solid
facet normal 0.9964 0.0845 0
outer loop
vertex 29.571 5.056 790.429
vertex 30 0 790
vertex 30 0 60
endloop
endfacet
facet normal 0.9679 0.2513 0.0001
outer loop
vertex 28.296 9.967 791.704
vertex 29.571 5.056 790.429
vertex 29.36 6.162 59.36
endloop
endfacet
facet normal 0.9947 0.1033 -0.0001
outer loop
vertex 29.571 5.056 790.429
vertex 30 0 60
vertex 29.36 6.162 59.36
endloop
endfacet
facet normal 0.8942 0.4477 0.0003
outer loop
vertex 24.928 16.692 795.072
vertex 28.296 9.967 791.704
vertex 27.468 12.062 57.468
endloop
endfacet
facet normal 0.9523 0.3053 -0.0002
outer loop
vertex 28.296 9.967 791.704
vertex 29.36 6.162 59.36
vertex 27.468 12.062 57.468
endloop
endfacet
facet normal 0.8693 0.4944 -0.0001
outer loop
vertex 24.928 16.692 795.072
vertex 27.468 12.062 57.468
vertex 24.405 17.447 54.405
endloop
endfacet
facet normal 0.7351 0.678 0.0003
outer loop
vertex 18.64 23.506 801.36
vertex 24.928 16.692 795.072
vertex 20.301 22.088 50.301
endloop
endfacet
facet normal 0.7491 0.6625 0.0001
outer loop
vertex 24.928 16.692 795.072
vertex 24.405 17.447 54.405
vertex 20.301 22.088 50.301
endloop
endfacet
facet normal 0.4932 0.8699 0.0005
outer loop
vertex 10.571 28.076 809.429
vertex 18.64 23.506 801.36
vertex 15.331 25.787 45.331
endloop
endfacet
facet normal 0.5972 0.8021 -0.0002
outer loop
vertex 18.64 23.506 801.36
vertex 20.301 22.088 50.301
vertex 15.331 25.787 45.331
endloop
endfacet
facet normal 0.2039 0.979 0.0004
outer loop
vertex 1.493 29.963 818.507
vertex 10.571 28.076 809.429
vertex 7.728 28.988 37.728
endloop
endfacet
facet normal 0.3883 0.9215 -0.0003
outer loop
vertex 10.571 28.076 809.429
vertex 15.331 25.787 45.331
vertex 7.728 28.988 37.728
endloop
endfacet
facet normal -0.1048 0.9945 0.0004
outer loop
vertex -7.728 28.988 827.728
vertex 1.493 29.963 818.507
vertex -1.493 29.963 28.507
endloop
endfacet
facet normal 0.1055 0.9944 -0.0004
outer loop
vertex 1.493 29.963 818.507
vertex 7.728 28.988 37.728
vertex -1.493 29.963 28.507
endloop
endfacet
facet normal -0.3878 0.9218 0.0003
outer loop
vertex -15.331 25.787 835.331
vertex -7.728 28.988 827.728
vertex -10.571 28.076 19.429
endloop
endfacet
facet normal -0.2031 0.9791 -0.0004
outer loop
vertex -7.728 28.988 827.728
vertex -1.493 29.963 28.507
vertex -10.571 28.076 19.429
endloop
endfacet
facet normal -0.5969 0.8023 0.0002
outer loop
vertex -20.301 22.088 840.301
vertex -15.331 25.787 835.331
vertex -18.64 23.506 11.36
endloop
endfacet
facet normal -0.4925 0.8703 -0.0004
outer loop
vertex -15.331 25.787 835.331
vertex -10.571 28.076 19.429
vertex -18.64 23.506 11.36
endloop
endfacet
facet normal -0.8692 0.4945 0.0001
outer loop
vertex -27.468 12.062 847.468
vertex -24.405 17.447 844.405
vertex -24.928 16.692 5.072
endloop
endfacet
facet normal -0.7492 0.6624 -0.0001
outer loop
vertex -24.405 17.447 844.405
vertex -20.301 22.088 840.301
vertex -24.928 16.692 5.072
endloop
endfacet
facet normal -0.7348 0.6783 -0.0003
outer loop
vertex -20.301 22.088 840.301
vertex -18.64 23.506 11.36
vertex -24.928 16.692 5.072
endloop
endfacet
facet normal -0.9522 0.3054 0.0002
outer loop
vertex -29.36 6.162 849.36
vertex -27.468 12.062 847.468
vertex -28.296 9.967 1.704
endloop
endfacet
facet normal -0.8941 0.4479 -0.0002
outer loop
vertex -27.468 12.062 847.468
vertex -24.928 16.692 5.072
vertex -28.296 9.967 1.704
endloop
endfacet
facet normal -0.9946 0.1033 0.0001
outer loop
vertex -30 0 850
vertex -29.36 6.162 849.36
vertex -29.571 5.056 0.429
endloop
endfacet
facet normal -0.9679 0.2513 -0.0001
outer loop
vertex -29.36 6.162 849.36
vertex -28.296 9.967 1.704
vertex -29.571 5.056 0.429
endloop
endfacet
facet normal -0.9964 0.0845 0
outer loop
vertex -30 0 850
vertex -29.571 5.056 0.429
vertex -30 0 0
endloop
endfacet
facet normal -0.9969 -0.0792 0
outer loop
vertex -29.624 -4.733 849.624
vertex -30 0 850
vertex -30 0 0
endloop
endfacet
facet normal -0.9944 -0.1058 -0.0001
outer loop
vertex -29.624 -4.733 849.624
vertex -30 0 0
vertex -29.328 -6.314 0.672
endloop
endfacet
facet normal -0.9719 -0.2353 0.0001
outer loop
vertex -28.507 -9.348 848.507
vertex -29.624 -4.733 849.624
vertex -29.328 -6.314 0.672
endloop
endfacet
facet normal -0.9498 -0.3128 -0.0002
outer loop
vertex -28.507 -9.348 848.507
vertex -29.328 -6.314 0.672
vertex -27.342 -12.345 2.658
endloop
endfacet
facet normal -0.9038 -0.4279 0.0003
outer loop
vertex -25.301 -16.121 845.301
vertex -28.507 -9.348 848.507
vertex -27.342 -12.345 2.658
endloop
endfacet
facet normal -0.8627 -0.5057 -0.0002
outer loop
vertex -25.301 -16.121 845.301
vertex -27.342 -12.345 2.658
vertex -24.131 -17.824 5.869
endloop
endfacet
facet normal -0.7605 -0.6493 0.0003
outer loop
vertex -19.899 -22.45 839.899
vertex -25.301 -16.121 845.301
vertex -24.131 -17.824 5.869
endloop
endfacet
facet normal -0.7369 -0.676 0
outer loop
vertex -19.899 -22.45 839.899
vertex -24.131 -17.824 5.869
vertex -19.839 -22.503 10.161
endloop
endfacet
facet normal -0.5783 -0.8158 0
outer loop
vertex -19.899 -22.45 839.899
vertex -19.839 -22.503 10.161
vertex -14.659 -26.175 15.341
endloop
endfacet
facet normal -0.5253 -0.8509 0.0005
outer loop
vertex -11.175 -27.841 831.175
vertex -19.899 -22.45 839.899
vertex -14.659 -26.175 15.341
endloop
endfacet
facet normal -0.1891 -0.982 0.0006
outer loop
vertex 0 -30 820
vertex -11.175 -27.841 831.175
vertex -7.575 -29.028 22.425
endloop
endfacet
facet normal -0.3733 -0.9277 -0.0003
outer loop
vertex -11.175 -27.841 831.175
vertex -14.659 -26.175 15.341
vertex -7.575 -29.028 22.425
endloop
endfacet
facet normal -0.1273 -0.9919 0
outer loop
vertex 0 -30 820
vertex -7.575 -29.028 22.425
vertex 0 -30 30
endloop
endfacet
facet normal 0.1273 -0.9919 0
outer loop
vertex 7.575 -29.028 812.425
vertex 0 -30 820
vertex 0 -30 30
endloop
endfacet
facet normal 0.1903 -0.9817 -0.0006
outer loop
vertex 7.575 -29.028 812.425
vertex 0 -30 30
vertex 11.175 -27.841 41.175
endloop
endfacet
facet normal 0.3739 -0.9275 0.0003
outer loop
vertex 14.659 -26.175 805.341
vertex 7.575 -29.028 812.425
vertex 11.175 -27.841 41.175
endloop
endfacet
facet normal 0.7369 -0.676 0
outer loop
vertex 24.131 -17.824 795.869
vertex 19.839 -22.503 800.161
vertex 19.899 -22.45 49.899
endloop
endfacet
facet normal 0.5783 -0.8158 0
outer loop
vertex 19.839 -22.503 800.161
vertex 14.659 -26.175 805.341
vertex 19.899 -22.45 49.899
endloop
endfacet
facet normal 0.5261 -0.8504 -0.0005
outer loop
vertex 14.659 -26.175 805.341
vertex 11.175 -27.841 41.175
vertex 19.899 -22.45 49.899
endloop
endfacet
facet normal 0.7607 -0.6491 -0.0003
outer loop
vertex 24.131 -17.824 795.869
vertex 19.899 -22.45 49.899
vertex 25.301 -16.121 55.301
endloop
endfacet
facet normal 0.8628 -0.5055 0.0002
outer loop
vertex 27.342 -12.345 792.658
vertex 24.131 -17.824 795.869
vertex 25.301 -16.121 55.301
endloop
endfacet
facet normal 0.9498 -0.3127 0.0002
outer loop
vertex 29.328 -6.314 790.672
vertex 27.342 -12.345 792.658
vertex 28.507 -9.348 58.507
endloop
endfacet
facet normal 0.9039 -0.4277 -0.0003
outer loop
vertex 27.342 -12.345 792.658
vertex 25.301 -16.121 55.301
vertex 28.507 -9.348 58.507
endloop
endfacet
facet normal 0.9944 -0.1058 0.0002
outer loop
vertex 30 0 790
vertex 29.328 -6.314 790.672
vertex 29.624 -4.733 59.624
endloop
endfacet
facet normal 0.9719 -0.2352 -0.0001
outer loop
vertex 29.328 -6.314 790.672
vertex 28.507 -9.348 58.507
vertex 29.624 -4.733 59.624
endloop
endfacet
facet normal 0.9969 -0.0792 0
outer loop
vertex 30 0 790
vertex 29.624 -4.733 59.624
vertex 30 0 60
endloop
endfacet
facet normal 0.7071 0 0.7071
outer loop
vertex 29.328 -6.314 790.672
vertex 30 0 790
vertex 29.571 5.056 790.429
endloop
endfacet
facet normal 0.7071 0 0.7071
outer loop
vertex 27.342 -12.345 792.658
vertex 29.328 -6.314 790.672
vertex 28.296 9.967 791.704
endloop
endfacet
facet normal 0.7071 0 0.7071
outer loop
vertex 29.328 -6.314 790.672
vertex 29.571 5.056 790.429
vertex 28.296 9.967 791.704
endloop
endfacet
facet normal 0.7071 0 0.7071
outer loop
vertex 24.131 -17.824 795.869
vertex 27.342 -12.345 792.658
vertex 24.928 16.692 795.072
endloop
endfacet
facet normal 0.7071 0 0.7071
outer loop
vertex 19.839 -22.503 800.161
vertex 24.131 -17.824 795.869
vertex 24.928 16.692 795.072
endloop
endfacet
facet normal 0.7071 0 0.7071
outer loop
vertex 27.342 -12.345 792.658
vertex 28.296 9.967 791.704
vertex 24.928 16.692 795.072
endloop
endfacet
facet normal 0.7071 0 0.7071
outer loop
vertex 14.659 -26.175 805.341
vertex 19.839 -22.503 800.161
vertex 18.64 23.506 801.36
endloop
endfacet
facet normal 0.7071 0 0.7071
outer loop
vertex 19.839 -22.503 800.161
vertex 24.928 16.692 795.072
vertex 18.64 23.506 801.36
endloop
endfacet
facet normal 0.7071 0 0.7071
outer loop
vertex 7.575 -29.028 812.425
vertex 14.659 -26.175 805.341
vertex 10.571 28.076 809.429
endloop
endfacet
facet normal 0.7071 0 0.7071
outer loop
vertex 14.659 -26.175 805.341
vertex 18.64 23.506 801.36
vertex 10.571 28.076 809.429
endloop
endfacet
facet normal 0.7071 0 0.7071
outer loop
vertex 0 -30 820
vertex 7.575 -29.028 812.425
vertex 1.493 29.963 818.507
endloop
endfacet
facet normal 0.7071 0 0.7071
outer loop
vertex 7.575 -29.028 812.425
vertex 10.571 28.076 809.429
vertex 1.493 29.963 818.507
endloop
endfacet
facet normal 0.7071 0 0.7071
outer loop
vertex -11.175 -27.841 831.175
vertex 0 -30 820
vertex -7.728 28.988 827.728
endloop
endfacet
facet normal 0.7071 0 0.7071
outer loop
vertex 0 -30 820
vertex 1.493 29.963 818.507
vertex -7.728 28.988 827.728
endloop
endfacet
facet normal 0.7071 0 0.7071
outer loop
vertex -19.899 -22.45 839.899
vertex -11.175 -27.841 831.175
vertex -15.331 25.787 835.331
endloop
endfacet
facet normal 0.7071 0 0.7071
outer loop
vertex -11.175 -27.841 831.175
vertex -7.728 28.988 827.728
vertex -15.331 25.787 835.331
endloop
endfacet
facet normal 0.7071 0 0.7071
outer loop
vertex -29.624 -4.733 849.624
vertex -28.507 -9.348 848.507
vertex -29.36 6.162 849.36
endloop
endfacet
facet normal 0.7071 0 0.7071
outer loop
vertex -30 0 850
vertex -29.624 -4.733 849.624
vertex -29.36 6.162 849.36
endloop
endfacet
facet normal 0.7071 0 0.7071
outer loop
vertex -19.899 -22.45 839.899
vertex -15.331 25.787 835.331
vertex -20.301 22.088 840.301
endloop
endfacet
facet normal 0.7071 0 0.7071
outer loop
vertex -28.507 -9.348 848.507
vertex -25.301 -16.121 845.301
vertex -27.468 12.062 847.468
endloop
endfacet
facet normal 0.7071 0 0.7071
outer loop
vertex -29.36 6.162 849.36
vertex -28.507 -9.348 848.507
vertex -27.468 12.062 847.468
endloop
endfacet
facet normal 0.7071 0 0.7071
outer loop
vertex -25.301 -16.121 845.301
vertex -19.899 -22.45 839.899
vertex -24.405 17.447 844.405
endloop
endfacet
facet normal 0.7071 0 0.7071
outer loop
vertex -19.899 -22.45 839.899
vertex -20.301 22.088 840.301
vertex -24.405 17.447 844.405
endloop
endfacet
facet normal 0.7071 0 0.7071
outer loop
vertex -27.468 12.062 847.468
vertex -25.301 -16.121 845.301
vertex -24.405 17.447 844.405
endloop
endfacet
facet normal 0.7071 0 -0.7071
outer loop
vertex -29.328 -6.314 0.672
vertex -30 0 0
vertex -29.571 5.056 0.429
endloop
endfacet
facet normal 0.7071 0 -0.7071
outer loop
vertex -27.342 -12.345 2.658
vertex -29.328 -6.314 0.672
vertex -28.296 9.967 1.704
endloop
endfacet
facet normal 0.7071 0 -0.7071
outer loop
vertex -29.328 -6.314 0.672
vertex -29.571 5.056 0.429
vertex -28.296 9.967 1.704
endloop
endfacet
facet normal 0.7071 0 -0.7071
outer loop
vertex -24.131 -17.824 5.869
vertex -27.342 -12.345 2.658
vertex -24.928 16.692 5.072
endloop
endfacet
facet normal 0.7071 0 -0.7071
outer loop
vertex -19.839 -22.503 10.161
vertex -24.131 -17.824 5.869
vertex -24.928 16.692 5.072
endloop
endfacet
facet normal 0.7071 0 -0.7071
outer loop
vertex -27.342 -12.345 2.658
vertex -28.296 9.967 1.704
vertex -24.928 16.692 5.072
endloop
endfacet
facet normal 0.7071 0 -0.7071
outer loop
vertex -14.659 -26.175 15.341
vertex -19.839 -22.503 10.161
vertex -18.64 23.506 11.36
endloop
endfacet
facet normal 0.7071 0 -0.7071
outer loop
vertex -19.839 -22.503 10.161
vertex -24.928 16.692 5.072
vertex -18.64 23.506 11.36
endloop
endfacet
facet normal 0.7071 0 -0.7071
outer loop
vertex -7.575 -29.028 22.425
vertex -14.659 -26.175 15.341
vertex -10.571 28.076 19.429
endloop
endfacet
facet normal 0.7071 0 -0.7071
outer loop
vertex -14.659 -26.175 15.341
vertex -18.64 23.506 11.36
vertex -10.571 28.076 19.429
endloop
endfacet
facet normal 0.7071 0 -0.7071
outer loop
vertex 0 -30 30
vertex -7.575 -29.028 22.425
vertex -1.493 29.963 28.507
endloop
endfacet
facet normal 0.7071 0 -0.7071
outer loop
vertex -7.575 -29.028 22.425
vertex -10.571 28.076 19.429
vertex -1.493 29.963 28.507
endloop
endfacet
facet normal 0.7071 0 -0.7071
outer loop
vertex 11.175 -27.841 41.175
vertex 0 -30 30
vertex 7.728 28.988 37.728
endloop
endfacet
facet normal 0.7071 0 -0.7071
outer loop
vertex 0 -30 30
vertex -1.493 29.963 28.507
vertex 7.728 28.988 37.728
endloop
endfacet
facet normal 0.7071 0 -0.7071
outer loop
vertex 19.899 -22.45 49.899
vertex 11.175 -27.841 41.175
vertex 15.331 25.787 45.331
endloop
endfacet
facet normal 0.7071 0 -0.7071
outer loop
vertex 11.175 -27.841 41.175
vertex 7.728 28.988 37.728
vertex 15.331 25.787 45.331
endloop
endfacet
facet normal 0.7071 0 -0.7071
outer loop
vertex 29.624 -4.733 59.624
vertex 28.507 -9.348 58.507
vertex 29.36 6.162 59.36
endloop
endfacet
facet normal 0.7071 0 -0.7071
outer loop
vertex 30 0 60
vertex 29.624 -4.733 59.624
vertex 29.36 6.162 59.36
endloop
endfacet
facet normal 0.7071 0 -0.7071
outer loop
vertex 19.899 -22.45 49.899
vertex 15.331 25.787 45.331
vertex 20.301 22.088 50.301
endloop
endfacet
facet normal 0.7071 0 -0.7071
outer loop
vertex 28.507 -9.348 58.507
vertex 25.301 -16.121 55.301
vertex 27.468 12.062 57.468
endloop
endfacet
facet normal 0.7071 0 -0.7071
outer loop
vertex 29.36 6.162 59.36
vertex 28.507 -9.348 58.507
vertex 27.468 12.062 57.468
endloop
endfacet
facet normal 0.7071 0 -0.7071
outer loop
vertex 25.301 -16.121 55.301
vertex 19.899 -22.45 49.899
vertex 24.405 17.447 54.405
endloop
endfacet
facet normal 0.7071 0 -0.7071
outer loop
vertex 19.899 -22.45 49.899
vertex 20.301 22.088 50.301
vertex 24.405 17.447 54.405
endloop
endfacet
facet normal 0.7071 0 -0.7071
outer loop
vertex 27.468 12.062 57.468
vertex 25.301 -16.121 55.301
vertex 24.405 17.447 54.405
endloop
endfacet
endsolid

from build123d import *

# Parameters (mm, degrees)
SKETCH1_R           = 30
BOSS_EXTRUDE2_DEPTH = 850
CUT_EXTRUDE1_DEPTH  = 70
CUT_EXTRUDE2_DEPTH  = 70


with BuildPart() as part:
    # Sketch1 → Boss-Extrude2 (new body)
    with BuildSketch(Plane.XY):
        Circle(SKETCH1_R)
    extrude(amount=BOSS_EXTRUDE2_DEPTH)

    # Sketch4 → Cut-Extrude1 (cut)
    with BuildSketch(Plane(origin=(0, 40, 0), x_dir=(1, 0, 0), z_dir=(0, 1, 0))):
        Polygon((-30, -850), (30, -850), (30, -790), align=None)
    extrude(amount=-CUT_EXTRUDE1_DEPTH, mode=Mode.SUBTRACT)

    # Sketch3 → Cut-Extrude2 (cut)
    with BuildSketch(Plane(origin=(0, 40, 0), x_dir=(1, 0, 0), z_dir=(0, 1, 0))):
        Polygon((-30, 0), (30, -60), (30, 0), align=None)
    extrude(amount=-CUT_EXTRUDE2_DEPTH, mode=Mode.SUBTRACT)


solid = part.part
